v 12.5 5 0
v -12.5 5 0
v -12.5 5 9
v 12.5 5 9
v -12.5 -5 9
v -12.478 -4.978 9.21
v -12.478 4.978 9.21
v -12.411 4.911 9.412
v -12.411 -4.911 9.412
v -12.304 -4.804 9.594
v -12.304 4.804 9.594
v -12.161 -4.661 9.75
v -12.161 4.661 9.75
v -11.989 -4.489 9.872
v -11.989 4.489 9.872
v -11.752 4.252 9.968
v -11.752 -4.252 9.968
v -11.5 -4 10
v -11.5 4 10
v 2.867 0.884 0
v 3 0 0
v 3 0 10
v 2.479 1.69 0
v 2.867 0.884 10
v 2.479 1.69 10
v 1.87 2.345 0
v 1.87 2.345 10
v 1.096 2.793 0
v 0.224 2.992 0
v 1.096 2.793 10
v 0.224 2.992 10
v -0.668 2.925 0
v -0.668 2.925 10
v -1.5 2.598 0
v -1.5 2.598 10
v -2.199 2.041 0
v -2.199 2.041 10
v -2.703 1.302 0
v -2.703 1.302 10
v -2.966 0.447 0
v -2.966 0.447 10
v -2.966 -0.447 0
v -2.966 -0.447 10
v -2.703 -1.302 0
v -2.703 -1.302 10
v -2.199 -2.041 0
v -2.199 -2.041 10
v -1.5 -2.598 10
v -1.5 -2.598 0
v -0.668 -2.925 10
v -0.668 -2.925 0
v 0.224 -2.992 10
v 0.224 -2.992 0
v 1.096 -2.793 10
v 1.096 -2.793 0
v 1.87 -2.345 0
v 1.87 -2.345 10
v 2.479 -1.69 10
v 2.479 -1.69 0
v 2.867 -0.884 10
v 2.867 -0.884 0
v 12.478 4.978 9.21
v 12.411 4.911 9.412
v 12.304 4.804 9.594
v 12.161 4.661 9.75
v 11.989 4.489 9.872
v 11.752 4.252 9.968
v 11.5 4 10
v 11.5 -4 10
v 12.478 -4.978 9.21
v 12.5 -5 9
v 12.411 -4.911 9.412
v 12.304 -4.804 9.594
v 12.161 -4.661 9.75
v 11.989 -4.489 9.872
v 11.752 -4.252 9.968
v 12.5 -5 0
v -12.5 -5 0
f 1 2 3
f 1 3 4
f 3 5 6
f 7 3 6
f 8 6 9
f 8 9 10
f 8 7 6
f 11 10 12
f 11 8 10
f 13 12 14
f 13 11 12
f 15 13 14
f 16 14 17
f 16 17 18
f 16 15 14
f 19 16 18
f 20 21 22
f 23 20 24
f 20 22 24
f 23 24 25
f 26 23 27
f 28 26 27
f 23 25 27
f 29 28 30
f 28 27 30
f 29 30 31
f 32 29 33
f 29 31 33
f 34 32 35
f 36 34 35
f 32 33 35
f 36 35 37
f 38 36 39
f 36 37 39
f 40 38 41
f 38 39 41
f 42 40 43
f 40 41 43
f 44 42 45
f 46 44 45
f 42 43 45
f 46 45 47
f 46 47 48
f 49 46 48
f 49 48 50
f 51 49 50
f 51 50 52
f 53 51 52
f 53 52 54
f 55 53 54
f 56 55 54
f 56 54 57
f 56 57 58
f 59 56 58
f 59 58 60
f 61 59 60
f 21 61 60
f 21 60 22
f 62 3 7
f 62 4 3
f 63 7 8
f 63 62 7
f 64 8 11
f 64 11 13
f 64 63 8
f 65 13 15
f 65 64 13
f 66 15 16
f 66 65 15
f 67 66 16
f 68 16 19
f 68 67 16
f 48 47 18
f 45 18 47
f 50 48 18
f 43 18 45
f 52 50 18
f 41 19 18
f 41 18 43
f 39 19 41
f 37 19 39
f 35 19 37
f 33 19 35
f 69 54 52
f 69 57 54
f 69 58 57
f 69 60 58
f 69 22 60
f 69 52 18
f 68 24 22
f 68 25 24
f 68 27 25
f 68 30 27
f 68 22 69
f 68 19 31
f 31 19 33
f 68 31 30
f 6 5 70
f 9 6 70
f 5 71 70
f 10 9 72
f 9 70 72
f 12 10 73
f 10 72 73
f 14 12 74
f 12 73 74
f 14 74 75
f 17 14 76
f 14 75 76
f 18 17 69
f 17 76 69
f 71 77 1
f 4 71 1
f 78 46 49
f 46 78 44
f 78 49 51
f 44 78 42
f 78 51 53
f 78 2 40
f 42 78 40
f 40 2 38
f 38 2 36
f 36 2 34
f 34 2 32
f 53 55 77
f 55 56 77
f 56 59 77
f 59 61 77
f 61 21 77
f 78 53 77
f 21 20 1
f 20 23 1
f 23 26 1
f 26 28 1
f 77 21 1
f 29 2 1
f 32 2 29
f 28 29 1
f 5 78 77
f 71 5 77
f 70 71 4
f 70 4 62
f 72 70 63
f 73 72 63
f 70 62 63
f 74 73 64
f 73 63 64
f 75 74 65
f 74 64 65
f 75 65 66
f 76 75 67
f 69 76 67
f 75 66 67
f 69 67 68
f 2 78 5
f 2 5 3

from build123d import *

# Parameters (mm, degrees)
F0_W     = 25
F0_H     = 10
F1_DEPTH = 10
F3_R     = 1
F2_R     = 3
F2_R_2   = 1.5
F4_DEPTH = 10.001


with BuildPart() as f1:
    # F0 (on Top) → F1 (new body)
    with BuildSketch(Plane.XY):
        Rectangle(F0_W, F0_H)
    extrude(amount=F1_DEPTH)

    # F3
    f3_edges = [f1.edges().sort_by_distance(p)[0] for p in [
        (0, 5, 10),
        (12.5, 0, 10),
        (0, -5, 10),
        (-12.5, 0, 10),
    ]]
    fillet(f3_edges, radius=F3_R)

    # F2 (on face) → F4 (cut, through all)
    with BuildSketch(Plane.XY.offset(10)):
        Circle(F2_R)
        Circle(F2_R_2, mode=Mode.SUBTRACT)
        Circle(F2_R_2)
    extrude(amount=-F4_DEPTH, mode=Mode.SUBTRACT)


solid = f1.part
